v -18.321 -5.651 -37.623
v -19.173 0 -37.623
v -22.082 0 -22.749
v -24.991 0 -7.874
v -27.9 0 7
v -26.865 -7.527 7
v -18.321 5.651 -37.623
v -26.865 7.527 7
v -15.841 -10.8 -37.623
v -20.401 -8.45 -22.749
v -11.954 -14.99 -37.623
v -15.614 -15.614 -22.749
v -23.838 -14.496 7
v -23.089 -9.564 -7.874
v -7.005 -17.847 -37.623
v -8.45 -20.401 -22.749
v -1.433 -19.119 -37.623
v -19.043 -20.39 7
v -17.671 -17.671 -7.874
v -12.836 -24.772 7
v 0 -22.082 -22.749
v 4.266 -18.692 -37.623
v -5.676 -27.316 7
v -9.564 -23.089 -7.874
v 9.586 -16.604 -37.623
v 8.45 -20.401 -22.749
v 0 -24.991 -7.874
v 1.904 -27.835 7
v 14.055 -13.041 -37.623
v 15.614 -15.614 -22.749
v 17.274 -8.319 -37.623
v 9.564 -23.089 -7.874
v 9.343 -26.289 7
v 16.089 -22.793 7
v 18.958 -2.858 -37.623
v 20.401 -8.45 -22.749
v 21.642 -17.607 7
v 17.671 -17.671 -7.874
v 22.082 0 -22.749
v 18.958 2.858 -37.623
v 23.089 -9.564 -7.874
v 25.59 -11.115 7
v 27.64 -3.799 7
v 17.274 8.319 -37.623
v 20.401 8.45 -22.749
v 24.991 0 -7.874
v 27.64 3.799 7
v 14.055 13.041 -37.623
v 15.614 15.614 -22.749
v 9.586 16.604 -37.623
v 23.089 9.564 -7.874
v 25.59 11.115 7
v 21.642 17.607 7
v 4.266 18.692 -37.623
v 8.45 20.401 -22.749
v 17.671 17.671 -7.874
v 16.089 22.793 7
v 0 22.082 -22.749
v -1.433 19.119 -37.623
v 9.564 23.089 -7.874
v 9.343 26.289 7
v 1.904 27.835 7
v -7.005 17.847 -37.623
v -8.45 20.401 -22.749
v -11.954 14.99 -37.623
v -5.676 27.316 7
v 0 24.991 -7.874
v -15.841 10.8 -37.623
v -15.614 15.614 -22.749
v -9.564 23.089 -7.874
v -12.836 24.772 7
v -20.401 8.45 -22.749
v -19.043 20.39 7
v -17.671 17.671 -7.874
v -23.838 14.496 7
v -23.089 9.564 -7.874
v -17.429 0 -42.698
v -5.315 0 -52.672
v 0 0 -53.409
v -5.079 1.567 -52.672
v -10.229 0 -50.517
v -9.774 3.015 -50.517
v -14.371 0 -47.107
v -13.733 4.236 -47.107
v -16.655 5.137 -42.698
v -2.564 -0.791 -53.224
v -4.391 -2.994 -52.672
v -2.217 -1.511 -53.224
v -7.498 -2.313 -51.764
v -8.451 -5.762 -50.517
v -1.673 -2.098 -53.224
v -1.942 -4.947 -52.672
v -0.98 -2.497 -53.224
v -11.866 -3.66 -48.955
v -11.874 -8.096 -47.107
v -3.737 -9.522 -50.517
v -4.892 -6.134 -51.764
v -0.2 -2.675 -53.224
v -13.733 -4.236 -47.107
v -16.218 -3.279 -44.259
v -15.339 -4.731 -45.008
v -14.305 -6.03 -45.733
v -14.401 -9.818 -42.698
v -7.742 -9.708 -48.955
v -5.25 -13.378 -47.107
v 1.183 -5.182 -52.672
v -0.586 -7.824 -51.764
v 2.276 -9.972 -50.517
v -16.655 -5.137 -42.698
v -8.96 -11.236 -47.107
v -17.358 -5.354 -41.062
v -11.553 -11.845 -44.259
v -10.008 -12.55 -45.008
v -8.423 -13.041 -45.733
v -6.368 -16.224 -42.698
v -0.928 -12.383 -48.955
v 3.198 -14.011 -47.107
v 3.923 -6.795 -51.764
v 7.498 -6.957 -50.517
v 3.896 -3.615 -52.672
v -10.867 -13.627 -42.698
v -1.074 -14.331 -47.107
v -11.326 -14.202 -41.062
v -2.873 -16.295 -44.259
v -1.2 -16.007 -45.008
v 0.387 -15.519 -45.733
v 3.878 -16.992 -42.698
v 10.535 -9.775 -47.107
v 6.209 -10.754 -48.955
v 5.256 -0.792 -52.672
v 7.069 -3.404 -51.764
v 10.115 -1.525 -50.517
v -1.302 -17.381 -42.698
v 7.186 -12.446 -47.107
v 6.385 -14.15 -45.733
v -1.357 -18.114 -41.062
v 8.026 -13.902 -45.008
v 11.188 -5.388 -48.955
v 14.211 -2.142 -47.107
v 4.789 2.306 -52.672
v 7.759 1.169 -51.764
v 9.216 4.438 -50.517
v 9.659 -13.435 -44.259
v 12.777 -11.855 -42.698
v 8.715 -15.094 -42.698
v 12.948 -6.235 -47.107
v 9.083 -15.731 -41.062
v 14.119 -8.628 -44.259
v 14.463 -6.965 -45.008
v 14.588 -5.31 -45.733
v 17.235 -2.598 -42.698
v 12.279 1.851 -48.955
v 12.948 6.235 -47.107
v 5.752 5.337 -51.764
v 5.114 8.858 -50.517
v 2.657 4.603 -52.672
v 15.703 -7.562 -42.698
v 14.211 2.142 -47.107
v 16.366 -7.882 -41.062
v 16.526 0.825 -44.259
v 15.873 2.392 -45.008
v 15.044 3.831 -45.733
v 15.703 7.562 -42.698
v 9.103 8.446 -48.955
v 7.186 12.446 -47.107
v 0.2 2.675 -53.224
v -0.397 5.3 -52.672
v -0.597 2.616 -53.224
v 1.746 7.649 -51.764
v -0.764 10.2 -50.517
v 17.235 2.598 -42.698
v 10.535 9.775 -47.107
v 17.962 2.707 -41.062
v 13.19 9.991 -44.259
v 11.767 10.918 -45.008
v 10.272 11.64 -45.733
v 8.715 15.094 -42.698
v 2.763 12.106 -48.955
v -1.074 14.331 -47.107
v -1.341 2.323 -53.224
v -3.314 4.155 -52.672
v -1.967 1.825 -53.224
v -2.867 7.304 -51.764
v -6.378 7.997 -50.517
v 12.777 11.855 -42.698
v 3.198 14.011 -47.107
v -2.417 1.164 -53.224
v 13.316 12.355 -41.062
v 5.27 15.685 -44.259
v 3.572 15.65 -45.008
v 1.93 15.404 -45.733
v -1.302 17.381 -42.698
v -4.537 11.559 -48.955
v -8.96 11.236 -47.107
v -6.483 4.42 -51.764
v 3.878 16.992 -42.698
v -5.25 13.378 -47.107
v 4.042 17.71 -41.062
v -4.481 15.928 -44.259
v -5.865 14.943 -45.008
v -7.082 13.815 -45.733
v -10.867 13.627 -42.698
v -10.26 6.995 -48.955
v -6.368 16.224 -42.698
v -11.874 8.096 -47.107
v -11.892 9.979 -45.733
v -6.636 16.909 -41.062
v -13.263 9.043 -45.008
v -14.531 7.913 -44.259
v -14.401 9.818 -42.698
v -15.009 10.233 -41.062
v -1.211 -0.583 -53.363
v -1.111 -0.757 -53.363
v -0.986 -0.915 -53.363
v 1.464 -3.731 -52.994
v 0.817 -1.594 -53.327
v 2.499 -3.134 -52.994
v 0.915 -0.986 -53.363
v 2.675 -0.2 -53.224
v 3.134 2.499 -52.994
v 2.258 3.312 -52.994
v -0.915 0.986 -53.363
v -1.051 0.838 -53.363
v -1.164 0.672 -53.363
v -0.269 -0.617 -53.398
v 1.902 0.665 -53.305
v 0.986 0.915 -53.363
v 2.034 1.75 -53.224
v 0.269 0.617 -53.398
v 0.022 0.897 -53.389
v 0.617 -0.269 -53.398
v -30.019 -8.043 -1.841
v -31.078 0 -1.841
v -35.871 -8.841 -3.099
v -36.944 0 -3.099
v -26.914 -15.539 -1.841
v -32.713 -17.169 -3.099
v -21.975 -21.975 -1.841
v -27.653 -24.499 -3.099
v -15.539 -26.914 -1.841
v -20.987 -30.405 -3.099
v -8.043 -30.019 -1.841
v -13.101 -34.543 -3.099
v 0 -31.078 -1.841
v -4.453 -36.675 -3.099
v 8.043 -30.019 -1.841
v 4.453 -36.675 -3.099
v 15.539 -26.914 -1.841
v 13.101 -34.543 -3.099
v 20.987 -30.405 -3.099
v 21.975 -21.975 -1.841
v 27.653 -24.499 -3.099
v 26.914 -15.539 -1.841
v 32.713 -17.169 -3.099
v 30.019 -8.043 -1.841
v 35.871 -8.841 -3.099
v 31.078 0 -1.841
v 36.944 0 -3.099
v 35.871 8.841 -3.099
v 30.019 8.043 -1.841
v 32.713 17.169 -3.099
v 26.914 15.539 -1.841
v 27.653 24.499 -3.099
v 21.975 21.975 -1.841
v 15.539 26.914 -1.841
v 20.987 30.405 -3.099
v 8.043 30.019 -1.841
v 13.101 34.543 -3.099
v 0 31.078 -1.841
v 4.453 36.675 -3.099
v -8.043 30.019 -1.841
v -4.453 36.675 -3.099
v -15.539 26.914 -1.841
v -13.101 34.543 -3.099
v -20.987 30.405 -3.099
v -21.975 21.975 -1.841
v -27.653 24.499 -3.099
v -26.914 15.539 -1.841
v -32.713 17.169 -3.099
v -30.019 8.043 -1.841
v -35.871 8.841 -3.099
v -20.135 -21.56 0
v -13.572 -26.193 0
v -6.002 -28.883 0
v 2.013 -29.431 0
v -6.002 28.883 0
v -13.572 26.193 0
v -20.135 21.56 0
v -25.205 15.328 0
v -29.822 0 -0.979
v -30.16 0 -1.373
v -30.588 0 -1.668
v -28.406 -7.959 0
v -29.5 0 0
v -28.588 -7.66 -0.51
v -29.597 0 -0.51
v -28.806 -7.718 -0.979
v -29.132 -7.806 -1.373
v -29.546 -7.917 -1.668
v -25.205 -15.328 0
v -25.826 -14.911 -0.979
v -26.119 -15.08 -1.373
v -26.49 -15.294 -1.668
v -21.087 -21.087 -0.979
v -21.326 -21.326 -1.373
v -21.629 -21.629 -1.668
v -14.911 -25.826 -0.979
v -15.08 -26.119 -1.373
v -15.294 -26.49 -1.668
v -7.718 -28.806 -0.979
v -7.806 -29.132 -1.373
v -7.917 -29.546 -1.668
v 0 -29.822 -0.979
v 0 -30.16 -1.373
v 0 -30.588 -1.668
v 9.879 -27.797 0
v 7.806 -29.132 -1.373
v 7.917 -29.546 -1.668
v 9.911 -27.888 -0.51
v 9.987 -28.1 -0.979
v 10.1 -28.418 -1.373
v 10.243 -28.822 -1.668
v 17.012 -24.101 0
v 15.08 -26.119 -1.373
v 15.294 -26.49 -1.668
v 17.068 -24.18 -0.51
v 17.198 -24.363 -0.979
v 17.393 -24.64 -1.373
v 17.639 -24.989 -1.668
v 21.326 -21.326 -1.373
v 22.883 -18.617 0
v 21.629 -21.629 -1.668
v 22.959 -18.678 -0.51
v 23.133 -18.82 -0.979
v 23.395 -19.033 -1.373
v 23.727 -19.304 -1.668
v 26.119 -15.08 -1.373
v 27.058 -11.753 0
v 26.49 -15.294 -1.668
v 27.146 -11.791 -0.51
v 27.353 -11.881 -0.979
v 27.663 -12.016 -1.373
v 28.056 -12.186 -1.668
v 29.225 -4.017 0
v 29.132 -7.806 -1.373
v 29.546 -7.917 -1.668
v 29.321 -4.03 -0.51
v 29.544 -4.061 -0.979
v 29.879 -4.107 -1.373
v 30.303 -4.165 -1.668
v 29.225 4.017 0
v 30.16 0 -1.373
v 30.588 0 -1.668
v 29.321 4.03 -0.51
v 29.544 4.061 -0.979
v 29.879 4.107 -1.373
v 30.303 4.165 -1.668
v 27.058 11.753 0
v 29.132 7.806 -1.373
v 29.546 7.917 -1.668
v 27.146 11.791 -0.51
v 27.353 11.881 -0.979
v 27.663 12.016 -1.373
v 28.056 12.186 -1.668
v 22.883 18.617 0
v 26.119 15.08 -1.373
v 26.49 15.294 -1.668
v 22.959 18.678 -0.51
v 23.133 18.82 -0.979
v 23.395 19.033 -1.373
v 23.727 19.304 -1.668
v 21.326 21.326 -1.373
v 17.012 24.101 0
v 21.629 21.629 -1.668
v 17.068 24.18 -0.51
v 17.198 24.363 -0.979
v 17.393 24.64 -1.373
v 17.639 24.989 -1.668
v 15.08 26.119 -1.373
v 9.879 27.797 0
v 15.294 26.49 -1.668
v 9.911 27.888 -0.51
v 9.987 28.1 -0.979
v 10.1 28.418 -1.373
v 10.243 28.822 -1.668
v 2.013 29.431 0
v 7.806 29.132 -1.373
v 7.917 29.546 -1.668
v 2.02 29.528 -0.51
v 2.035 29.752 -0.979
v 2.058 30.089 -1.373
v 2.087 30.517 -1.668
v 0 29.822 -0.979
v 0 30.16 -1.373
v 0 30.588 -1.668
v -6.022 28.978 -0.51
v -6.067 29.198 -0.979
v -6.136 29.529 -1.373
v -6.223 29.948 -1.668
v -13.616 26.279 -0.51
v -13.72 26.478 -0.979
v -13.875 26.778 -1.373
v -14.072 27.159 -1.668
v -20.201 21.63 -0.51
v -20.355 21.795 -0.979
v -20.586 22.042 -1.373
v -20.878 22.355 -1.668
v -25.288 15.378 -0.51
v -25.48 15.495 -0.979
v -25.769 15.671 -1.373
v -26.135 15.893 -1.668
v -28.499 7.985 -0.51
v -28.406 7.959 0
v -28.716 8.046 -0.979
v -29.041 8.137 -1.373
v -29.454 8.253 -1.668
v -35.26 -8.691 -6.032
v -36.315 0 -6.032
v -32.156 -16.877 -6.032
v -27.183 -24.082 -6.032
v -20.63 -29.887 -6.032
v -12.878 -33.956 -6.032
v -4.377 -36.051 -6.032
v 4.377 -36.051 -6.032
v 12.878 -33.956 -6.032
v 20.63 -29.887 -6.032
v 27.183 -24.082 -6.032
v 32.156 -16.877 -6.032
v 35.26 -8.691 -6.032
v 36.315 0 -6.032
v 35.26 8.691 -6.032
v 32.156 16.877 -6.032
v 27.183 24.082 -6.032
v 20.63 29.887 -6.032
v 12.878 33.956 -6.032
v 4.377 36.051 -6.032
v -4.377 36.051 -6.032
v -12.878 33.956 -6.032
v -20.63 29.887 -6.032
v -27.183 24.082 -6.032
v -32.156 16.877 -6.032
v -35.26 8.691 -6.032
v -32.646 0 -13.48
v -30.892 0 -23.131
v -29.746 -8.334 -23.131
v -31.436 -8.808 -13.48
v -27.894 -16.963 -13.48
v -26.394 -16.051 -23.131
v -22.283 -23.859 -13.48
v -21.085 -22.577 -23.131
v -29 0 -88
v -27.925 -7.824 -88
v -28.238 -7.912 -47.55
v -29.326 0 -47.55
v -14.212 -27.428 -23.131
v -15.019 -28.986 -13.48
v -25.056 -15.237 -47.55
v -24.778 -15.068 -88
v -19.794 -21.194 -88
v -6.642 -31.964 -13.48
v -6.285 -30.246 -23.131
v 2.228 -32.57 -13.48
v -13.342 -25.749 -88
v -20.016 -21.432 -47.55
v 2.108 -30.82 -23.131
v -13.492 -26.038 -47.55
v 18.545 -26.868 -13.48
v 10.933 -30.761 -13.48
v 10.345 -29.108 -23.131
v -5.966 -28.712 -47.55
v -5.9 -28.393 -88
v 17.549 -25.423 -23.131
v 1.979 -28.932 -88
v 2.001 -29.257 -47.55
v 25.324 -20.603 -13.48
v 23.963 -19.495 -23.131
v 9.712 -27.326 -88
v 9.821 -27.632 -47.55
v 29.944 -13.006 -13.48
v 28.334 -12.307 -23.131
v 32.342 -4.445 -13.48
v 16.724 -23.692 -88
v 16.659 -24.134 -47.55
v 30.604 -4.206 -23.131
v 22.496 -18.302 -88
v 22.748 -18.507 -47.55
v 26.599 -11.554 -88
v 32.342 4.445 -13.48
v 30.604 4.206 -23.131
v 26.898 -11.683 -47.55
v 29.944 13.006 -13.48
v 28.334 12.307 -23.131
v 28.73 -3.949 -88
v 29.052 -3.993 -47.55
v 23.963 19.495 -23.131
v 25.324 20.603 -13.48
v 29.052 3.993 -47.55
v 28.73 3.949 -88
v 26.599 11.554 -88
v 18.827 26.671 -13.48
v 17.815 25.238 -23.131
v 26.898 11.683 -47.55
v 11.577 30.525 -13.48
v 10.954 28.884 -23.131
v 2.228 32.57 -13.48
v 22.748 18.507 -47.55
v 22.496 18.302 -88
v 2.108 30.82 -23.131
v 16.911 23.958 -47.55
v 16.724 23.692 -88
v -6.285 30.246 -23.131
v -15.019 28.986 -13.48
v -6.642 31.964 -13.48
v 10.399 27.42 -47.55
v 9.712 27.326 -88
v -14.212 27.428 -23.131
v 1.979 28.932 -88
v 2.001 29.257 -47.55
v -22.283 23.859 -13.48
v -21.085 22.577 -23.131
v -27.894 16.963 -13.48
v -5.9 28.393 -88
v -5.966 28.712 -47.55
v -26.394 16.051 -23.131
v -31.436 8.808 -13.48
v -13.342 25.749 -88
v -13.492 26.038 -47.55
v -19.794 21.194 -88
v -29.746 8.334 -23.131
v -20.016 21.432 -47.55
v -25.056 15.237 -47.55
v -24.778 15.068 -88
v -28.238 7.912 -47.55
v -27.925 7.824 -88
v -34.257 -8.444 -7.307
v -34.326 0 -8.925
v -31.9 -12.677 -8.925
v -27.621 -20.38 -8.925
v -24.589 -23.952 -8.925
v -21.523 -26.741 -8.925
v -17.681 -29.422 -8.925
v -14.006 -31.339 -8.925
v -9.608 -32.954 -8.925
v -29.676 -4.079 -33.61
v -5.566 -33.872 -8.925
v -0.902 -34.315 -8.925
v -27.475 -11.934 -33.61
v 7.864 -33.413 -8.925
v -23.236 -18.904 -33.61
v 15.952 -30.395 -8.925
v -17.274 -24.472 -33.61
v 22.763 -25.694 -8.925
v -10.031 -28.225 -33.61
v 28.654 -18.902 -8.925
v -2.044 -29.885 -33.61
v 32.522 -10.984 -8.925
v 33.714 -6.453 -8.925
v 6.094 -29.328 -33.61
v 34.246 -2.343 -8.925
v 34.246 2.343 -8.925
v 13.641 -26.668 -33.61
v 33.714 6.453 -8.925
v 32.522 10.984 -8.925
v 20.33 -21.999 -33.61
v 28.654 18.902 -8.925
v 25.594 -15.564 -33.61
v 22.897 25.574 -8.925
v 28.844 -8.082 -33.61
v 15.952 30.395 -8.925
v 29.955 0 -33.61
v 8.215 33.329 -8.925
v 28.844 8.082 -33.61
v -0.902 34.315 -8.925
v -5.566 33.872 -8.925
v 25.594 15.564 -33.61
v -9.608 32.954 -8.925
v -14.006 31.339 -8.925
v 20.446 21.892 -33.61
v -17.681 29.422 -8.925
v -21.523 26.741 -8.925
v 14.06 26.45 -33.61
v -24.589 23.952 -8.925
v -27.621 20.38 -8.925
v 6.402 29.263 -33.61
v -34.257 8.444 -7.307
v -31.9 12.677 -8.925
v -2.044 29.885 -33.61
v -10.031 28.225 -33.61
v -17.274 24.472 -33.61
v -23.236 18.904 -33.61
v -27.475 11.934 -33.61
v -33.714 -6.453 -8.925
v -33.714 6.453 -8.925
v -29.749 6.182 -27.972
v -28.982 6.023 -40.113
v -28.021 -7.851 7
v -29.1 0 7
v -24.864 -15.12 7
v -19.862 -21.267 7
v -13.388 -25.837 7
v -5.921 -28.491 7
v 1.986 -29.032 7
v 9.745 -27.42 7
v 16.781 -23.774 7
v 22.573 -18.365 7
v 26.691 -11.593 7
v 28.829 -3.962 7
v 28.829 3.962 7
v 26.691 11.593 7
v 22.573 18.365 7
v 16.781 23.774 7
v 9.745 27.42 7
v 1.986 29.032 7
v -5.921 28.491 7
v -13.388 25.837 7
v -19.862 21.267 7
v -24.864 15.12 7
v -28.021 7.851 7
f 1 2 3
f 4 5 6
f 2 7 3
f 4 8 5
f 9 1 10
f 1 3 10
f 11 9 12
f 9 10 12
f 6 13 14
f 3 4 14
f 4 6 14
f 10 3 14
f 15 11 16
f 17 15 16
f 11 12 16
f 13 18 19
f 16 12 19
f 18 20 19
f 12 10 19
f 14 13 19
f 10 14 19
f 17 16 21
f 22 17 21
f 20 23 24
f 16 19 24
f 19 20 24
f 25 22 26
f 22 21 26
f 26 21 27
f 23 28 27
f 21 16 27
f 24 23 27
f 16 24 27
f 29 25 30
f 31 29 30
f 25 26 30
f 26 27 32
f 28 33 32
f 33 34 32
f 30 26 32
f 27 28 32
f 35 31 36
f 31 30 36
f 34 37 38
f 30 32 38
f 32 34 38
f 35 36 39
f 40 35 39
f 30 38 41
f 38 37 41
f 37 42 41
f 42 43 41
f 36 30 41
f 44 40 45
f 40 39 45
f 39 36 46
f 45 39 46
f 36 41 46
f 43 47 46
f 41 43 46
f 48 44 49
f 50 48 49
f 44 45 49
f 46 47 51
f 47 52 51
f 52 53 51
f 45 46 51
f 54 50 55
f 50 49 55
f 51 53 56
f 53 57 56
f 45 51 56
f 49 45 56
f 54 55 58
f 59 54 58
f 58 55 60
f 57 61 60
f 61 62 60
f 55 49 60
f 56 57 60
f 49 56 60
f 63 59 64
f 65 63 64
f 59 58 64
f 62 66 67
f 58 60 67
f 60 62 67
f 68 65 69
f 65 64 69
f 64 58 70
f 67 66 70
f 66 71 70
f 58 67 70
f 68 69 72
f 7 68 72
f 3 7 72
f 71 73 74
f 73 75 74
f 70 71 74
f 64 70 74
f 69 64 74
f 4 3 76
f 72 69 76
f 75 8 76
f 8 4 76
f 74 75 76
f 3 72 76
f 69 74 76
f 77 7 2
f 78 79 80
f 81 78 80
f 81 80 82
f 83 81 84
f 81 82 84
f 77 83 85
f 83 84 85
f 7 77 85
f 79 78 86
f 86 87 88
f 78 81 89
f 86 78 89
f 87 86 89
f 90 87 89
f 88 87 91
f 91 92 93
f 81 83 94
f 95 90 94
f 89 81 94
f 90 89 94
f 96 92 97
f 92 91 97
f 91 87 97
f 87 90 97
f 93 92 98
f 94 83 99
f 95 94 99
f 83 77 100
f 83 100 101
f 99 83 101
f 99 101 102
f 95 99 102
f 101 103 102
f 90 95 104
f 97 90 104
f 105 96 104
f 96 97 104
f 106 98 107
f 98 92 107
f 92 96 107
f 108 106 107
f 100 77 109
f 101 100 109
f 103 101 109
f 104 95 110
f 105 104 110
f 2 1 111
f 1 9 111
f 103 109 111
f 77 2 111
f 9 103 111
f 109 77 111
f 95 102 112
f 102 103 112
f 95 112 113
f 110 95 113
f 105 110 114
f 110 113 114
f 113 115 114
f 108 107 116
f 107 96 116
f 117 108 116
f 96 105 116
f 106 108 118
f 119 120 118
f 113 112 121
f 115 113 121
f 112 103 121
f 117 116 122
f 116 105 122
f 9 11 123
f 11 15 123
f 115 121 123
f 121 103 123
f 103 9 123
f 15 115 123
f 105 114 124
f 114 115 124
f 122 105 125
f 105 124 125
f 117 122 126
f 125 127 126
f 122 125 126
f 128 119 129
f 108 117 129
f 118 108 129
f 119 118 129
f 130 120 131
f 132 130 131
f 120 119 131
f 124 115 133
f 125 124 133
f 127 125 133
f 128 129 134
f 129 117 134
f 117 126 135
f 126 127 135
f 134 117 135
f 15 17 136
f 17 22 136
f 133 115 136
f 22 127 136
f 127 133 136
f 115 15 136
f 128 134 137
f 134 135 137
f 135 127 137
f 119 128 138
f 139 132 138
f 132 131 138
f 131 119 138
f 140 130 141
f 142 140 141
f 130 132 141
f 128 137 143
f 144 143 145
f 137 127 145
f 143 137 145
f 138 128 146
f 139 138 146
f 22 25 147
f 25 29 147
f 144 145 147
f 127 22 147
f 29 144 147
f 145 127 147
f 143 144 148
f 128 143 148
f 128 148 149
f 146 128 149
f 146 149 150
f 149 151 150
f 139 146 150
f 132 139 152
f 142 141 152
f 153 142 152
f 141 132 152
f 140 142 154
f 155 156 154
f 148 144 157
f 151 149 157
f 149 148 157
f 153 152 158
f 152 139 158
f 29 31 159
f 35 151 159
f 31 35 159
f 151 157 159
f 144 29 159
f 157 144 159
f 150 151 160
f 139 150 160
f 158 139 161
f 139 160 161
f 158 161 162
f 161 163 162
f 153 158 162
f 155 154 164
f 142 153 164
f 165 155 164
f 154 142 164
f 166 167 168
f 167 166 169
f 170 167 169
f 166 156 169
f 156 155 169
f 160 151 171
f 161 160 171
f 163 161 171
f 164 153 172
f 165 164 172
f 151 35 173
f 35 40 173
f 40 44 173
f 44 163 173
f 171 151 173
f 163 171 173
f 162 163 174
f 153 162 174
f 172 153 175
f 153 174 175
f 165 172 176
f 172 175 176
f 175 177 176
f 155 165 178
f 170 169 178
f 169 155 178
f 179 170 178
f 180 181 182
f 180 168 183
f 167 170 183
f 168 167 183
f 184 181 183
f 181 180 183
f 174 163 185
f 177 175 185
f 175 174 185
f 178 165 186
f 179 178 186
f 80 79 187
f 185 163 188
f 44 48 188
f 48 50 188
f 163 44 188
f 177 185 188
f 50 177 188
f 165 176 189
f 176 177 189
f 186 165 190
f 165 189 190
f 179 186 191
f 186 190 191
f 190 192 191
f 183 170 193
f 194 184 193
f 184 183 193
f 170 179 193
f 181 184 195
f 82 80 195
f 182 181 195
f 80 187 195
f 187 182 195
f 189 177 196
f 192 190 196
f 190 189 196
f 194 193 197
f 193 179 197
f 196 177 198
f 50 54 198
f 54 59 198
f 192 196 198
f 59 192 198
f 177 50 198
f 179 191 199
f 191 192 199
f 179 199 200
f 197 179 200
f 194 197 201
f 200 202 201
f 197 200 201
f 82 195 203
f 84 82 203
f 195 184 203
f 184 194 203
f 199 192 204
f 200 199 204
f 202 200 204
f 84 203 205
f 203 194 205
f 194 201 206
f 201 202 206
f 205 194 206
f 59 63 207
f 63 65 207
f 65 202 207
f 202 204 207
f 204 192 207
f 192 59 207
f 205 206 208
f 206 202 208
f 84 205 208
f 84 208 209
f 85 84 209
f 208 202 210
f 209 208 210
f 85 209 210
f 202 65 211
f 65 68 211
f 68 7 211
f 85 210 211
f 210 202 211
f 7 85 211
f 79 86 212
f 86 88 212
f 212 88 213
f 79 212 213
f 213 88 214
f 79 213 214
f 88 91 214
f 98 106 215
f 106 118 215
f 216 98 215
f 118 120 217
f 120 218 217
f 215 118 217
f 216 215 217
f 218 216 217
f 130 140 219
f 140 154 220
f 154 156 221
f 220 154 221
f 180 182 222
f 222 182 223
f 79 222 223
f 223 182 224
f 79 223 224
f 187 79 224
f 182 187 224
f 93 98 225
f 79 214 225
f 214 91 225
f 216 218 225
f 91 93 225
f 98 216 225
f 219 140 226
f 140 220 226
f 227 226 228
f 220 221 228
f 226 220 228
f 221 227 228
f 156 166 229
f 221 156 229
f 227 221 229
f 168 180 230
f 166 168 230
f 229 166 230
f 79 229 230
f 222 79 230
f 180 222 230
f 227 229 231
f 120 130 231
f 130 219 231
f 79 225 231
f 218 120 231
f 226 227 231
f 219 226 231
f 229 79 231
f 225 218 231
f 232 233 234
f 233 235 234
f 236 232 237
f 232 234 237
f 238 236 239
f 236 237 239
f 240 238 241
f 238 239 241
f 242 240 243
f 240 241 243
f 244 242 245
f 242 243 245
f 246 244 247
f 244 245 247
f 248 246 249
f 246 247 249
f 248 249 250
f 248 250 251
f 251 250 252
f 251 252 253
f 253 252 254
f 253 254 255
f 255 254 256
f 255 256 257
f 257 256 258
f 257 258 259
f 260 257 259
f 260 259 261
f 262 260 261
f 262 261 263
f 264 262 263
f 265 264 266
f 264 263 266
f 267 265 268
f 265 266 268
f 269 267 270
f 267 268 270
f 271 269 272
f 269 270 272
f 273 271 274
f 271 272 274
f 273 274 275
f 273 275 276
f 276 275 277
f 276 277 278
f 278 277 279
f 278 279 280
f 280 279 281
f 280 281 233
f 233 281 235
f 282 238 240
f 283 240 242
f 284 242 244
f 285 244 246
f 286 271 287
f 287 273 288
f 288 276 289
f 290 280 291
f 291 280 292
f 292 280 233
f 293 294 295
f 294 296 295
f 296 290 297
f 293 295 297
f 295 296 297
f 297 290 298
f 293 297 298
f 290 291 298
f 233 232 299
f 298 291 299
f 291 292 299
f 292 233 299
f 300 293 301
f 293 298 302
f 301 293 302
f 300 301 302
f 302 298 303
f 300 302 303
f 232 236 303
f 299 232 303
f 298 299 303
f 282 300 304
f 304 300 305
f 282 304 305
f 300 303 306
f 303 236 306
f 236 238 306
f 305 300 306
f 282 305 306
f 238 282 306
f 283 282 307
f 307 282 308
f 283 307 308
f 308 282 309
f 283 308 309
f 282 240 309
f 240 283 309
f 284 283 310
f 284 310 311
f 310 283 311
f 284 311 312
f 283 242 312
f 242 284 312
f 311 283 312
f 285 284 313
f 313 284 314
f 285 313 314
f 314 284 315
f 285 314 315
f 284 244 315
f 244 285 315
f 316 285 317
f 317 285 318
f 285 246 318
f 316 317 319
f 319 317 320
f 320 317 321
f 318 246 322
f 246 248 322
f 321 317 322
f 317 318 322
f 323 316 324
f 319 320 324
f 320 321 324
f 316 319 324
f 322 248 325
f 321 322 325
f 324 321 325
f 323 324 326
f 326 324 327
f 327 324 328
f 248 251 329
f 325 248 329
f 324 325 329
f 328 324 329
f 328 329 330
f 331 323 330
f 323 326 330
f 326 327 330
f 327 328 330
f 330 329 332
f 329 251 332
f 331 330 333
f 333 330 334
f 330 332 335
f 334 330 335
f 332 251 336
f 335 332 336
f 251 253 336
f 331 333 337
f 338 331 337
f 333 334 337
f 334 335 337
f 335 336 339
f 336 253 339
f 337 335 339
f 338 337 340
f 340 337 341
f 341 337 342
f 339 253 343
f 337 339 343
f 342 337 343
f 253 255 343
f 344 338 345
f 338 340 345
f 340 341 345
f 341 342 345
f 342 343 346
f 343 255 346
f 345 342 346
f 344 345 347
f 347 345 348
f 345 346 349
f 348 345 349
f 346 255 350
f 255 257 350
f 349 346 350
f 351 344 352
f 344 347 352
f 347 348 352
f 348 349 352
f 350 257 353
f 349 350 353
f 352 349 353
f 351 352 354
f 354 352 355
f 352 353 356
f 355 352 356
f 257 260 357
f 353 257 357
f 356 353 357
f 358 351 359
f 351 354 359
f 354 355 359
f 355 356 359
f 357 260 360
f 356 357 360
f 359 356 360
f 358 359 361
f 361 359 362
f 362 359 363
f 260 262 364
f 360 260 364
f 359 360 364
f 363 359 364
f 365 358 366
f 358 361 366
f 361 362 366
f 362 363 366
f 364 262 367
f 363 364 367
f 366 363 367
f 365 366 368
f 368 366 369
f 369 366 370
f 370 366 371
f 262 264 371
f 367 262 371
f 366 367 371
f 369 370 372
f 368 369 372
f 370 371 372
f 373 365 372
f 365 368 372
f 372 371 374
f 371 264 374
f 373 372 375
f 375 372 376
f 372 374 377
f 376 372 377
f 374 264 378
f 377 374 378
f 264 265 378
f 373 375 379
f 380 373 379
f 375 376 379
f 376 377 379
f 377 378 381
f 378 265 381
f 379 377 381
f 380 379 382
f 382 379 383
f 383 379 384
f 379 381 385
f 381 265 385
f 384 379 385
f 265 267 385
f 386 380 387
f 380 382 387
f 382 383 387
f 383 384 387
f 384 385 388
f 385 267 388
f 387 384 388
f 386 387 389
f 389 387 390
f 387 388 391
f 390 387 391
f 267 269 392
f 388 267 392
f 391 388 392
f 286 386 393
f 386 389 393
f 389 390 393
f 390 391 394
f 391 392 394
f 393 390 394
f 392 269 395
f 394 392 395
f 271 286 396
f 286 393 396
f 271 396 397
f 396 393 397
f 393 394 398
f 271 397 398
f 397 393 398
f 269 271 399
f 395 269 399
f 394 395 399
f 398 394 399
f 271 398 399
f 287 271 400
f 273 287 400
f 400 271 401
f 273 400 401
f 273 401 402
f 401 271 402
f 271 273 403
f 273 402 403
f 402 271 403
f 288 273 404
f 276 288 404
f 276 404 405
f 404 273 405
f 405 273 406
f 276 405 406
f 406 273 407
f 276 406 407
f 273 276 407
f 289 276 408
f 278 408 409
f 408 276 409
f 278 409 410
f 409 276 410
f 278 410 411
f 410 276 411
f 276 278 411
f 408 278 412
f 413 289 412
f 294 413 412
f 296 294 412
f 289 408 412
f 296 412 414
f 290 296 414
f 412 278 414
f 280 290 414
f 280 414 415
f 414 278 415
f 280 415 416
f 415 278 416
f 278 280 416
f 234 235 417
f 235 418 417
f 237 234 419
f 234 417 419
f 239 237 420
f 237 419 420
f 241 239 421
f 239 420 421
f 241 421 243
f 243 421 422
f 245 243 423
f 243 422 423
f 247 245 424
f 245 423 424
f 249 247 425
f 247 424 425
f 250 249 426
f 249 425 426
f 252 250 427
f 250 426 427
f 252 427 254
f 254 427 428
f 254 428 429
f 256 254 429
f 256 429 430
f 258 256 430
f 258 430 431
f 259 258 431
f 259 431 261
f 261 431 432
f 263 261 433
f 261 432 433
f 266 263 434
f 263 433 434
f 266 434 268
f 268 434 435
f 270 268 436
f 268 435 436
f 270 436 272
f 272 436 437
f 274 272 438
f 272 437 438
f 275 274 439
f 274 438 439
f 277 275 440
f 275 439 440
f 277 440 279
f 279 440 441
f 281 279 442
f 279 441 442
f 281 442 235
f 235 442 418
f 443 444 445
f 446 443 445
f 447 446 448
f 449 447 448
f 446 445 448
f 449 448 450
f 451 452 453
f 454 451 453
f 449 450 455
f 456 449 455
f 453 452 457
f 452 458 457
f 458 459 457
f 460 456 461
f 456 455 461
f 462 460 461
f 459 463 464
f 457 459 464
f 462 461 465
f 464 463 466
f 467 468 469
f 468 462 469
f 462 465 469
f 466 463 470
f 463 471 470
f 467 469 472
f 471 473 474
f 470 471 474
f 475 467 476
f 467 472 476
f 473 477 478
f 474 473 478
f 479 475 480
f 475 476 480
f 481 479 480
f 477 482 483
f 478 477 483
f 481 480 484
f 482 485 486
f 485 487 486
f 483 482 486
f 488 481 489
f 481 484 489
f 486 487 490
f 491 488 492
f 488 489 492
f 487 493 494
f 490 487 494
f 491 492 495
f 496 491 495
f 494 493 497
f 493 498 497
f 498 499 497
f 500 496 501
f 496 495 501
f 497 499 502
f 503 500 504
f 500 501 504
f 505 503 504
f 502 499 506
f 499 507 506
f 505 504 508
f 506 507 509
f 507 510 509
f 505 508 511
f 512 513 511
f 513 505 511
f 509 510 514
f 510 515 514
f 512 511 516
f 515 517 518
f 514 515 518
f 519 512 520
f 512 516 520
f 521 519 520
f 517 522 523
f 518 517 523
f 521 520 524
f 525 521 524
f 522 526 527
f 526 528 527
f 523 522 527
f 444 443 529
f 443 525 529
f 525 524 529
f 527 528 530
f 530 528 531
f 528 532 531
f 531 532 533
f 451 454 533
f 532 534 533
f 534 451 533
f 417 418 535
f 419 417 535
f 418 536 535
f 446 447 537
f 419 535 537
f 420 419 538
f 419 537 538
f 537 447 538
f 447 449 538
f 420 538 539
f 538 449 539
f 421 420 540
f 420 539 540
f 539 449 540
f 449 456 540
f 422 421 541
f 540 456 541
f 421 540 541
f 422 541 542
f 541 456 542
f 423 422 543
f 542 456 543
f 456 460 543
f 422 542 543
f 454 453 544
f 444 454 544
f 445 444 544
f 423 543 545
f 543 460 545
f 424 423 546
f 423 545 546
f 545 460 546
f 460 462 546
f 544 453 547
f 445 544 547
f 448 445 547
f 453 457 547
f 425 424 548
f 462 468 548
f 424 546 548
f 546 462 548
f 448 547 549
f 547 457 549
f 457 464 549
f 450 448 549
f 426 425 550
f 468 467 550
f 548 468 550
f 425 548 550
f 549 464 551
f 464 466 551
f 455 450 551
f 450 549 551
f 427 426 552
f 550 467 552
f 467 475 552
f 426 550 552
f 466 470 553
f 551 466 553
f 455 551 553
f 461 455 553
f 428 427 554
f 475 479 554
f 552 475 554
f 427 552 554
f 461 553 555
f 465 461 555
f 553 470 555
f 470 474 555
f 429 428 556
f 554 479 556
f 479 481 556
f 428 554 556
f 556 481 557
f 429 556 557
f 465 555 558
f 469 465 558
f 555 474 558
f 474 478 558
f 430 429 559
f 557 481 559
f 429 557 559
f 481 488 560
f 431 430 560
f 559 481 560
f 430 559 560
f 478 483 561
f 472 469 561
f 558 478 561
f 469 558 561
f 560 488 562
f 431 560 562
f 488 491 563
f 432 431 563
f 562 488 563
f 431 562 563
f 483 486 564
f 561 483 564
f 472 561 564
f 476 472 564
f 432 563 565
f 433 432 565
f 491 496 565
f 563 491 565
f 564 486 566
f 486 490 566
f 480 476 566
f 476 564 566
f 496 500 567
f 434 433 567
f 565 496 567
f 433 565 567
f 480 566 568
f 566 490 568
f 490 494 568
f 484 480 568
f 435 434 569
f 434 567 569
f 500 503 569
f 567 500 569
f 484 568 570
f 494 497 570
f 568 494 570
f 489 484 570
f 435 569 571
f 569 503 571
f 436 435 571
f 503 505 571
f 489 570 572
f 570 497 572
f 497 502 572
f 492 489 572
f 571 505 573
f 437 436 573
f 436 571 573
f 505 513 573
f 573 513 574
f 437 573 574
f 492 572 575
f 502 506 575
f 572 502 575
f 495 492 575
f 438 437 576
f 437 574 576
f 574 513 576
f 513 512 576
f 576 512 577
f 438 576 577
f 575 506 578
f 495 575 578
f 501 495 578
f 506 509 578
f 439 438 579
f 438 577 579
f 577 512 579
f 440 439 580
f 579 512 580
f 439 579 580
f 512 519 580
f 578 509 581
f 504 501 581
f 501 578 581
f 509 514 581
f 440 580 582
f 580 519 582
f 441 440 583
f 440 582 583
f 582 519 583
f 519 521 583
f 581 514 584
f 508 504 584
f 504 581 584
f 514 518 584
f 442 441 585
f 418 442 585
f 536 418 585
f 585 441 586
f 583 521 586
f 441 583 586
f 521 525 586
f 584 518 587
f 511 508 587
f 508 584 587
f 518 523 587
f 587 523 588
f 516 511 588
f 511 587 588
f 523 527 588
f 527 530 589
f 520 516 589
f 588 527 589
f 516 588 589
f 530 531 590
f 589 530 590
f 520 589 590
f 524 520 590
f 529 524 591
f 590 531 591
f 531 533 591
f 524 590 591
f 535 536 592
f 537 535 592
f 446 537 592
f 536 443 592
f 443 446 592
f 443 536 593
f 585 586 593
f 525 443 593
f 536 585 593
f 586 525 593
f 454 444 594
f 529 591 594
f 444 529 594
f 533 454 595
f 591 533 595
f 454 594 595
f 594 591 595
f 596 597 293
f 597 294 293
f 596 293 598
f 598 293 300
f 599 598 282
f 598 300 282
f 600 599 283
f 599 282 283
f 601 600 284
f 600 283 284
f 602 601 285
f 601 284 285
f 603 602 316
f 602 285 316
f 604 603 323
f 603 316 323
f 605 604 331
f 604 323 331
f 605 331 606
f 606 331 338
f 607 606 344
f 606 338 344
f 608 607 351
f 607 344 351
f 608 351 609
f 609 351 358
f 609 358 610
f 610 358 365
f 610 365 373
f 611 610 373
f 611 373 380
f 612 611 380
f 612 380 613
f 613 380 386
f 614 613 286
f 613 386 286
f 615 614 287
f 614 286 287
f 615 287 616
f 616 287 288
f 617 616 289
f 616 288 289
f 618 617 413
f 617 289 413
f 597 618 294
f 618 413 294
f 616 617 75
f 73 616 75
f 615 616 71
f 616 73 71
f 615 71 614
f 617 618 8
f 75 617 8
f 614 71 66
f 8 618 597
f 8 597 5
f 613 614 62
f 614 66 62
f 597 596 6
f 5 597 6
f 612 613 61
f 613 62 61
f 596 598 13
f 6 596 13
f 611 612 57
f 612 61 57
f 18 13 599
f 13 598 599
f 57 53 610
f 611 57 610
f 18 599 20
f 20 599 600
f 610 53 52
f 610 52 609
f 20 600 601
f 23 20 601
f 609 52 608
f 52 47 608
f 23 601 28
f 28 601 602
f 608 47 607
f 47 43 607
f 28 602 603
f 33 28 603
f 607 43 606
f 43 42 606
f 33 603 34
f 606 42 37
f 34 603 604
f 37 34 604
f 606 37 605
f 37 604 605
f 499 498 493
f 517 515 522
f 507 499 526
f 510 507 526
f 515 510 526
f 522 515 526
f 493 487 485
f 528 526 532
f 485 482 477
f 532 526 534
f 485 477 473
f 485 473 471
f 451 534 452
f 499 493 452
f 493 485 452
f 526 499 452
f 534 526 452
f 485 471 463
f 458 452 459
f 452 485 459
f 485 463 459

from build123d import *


with BuildPart() as f1:
    # F0 (on Front) → F1 (revolve)
    with BuildSketch(Plane.XZ):
        with BuildLine():
            Line((-27.9, 7), (-29.1, 7))
            Line((-29.1, 7), (-29.5, 0))
            ThreePointArc((-29.5, 0), (-29.977877, -1.187072), (-31.077542, -1.841475))
            Line((-31.077542, -1.841475), (-36.944266, -3.099075))
            Line((-36.944266, -3.099075), (-36.315465, -6.032437))
            add(Edge.make_bspline(
                [(-36.315465, -6.032437), (-31.120499, -11.492784), (-28.629433, -26.551809), (-29, -88)],
                knots=[0, 0, 0, 0, 82.293362, 82.293362, 82.293362, 82.293362], degree=3))
            Line((-29, -88), (0, -88))
            Line((0, -88), (0, -53.40915))
            ThreePointArc((0, -53.40915), (-12.417609, -48.954825), (-19.172594, -37.62309))
            Line((-19.172594, -37.62309), (-27.9, 7))
        make_face()
    revolve(axis=Axis((0, 0, -70.704575), (0, 0, 1)))


solid = f1.part
